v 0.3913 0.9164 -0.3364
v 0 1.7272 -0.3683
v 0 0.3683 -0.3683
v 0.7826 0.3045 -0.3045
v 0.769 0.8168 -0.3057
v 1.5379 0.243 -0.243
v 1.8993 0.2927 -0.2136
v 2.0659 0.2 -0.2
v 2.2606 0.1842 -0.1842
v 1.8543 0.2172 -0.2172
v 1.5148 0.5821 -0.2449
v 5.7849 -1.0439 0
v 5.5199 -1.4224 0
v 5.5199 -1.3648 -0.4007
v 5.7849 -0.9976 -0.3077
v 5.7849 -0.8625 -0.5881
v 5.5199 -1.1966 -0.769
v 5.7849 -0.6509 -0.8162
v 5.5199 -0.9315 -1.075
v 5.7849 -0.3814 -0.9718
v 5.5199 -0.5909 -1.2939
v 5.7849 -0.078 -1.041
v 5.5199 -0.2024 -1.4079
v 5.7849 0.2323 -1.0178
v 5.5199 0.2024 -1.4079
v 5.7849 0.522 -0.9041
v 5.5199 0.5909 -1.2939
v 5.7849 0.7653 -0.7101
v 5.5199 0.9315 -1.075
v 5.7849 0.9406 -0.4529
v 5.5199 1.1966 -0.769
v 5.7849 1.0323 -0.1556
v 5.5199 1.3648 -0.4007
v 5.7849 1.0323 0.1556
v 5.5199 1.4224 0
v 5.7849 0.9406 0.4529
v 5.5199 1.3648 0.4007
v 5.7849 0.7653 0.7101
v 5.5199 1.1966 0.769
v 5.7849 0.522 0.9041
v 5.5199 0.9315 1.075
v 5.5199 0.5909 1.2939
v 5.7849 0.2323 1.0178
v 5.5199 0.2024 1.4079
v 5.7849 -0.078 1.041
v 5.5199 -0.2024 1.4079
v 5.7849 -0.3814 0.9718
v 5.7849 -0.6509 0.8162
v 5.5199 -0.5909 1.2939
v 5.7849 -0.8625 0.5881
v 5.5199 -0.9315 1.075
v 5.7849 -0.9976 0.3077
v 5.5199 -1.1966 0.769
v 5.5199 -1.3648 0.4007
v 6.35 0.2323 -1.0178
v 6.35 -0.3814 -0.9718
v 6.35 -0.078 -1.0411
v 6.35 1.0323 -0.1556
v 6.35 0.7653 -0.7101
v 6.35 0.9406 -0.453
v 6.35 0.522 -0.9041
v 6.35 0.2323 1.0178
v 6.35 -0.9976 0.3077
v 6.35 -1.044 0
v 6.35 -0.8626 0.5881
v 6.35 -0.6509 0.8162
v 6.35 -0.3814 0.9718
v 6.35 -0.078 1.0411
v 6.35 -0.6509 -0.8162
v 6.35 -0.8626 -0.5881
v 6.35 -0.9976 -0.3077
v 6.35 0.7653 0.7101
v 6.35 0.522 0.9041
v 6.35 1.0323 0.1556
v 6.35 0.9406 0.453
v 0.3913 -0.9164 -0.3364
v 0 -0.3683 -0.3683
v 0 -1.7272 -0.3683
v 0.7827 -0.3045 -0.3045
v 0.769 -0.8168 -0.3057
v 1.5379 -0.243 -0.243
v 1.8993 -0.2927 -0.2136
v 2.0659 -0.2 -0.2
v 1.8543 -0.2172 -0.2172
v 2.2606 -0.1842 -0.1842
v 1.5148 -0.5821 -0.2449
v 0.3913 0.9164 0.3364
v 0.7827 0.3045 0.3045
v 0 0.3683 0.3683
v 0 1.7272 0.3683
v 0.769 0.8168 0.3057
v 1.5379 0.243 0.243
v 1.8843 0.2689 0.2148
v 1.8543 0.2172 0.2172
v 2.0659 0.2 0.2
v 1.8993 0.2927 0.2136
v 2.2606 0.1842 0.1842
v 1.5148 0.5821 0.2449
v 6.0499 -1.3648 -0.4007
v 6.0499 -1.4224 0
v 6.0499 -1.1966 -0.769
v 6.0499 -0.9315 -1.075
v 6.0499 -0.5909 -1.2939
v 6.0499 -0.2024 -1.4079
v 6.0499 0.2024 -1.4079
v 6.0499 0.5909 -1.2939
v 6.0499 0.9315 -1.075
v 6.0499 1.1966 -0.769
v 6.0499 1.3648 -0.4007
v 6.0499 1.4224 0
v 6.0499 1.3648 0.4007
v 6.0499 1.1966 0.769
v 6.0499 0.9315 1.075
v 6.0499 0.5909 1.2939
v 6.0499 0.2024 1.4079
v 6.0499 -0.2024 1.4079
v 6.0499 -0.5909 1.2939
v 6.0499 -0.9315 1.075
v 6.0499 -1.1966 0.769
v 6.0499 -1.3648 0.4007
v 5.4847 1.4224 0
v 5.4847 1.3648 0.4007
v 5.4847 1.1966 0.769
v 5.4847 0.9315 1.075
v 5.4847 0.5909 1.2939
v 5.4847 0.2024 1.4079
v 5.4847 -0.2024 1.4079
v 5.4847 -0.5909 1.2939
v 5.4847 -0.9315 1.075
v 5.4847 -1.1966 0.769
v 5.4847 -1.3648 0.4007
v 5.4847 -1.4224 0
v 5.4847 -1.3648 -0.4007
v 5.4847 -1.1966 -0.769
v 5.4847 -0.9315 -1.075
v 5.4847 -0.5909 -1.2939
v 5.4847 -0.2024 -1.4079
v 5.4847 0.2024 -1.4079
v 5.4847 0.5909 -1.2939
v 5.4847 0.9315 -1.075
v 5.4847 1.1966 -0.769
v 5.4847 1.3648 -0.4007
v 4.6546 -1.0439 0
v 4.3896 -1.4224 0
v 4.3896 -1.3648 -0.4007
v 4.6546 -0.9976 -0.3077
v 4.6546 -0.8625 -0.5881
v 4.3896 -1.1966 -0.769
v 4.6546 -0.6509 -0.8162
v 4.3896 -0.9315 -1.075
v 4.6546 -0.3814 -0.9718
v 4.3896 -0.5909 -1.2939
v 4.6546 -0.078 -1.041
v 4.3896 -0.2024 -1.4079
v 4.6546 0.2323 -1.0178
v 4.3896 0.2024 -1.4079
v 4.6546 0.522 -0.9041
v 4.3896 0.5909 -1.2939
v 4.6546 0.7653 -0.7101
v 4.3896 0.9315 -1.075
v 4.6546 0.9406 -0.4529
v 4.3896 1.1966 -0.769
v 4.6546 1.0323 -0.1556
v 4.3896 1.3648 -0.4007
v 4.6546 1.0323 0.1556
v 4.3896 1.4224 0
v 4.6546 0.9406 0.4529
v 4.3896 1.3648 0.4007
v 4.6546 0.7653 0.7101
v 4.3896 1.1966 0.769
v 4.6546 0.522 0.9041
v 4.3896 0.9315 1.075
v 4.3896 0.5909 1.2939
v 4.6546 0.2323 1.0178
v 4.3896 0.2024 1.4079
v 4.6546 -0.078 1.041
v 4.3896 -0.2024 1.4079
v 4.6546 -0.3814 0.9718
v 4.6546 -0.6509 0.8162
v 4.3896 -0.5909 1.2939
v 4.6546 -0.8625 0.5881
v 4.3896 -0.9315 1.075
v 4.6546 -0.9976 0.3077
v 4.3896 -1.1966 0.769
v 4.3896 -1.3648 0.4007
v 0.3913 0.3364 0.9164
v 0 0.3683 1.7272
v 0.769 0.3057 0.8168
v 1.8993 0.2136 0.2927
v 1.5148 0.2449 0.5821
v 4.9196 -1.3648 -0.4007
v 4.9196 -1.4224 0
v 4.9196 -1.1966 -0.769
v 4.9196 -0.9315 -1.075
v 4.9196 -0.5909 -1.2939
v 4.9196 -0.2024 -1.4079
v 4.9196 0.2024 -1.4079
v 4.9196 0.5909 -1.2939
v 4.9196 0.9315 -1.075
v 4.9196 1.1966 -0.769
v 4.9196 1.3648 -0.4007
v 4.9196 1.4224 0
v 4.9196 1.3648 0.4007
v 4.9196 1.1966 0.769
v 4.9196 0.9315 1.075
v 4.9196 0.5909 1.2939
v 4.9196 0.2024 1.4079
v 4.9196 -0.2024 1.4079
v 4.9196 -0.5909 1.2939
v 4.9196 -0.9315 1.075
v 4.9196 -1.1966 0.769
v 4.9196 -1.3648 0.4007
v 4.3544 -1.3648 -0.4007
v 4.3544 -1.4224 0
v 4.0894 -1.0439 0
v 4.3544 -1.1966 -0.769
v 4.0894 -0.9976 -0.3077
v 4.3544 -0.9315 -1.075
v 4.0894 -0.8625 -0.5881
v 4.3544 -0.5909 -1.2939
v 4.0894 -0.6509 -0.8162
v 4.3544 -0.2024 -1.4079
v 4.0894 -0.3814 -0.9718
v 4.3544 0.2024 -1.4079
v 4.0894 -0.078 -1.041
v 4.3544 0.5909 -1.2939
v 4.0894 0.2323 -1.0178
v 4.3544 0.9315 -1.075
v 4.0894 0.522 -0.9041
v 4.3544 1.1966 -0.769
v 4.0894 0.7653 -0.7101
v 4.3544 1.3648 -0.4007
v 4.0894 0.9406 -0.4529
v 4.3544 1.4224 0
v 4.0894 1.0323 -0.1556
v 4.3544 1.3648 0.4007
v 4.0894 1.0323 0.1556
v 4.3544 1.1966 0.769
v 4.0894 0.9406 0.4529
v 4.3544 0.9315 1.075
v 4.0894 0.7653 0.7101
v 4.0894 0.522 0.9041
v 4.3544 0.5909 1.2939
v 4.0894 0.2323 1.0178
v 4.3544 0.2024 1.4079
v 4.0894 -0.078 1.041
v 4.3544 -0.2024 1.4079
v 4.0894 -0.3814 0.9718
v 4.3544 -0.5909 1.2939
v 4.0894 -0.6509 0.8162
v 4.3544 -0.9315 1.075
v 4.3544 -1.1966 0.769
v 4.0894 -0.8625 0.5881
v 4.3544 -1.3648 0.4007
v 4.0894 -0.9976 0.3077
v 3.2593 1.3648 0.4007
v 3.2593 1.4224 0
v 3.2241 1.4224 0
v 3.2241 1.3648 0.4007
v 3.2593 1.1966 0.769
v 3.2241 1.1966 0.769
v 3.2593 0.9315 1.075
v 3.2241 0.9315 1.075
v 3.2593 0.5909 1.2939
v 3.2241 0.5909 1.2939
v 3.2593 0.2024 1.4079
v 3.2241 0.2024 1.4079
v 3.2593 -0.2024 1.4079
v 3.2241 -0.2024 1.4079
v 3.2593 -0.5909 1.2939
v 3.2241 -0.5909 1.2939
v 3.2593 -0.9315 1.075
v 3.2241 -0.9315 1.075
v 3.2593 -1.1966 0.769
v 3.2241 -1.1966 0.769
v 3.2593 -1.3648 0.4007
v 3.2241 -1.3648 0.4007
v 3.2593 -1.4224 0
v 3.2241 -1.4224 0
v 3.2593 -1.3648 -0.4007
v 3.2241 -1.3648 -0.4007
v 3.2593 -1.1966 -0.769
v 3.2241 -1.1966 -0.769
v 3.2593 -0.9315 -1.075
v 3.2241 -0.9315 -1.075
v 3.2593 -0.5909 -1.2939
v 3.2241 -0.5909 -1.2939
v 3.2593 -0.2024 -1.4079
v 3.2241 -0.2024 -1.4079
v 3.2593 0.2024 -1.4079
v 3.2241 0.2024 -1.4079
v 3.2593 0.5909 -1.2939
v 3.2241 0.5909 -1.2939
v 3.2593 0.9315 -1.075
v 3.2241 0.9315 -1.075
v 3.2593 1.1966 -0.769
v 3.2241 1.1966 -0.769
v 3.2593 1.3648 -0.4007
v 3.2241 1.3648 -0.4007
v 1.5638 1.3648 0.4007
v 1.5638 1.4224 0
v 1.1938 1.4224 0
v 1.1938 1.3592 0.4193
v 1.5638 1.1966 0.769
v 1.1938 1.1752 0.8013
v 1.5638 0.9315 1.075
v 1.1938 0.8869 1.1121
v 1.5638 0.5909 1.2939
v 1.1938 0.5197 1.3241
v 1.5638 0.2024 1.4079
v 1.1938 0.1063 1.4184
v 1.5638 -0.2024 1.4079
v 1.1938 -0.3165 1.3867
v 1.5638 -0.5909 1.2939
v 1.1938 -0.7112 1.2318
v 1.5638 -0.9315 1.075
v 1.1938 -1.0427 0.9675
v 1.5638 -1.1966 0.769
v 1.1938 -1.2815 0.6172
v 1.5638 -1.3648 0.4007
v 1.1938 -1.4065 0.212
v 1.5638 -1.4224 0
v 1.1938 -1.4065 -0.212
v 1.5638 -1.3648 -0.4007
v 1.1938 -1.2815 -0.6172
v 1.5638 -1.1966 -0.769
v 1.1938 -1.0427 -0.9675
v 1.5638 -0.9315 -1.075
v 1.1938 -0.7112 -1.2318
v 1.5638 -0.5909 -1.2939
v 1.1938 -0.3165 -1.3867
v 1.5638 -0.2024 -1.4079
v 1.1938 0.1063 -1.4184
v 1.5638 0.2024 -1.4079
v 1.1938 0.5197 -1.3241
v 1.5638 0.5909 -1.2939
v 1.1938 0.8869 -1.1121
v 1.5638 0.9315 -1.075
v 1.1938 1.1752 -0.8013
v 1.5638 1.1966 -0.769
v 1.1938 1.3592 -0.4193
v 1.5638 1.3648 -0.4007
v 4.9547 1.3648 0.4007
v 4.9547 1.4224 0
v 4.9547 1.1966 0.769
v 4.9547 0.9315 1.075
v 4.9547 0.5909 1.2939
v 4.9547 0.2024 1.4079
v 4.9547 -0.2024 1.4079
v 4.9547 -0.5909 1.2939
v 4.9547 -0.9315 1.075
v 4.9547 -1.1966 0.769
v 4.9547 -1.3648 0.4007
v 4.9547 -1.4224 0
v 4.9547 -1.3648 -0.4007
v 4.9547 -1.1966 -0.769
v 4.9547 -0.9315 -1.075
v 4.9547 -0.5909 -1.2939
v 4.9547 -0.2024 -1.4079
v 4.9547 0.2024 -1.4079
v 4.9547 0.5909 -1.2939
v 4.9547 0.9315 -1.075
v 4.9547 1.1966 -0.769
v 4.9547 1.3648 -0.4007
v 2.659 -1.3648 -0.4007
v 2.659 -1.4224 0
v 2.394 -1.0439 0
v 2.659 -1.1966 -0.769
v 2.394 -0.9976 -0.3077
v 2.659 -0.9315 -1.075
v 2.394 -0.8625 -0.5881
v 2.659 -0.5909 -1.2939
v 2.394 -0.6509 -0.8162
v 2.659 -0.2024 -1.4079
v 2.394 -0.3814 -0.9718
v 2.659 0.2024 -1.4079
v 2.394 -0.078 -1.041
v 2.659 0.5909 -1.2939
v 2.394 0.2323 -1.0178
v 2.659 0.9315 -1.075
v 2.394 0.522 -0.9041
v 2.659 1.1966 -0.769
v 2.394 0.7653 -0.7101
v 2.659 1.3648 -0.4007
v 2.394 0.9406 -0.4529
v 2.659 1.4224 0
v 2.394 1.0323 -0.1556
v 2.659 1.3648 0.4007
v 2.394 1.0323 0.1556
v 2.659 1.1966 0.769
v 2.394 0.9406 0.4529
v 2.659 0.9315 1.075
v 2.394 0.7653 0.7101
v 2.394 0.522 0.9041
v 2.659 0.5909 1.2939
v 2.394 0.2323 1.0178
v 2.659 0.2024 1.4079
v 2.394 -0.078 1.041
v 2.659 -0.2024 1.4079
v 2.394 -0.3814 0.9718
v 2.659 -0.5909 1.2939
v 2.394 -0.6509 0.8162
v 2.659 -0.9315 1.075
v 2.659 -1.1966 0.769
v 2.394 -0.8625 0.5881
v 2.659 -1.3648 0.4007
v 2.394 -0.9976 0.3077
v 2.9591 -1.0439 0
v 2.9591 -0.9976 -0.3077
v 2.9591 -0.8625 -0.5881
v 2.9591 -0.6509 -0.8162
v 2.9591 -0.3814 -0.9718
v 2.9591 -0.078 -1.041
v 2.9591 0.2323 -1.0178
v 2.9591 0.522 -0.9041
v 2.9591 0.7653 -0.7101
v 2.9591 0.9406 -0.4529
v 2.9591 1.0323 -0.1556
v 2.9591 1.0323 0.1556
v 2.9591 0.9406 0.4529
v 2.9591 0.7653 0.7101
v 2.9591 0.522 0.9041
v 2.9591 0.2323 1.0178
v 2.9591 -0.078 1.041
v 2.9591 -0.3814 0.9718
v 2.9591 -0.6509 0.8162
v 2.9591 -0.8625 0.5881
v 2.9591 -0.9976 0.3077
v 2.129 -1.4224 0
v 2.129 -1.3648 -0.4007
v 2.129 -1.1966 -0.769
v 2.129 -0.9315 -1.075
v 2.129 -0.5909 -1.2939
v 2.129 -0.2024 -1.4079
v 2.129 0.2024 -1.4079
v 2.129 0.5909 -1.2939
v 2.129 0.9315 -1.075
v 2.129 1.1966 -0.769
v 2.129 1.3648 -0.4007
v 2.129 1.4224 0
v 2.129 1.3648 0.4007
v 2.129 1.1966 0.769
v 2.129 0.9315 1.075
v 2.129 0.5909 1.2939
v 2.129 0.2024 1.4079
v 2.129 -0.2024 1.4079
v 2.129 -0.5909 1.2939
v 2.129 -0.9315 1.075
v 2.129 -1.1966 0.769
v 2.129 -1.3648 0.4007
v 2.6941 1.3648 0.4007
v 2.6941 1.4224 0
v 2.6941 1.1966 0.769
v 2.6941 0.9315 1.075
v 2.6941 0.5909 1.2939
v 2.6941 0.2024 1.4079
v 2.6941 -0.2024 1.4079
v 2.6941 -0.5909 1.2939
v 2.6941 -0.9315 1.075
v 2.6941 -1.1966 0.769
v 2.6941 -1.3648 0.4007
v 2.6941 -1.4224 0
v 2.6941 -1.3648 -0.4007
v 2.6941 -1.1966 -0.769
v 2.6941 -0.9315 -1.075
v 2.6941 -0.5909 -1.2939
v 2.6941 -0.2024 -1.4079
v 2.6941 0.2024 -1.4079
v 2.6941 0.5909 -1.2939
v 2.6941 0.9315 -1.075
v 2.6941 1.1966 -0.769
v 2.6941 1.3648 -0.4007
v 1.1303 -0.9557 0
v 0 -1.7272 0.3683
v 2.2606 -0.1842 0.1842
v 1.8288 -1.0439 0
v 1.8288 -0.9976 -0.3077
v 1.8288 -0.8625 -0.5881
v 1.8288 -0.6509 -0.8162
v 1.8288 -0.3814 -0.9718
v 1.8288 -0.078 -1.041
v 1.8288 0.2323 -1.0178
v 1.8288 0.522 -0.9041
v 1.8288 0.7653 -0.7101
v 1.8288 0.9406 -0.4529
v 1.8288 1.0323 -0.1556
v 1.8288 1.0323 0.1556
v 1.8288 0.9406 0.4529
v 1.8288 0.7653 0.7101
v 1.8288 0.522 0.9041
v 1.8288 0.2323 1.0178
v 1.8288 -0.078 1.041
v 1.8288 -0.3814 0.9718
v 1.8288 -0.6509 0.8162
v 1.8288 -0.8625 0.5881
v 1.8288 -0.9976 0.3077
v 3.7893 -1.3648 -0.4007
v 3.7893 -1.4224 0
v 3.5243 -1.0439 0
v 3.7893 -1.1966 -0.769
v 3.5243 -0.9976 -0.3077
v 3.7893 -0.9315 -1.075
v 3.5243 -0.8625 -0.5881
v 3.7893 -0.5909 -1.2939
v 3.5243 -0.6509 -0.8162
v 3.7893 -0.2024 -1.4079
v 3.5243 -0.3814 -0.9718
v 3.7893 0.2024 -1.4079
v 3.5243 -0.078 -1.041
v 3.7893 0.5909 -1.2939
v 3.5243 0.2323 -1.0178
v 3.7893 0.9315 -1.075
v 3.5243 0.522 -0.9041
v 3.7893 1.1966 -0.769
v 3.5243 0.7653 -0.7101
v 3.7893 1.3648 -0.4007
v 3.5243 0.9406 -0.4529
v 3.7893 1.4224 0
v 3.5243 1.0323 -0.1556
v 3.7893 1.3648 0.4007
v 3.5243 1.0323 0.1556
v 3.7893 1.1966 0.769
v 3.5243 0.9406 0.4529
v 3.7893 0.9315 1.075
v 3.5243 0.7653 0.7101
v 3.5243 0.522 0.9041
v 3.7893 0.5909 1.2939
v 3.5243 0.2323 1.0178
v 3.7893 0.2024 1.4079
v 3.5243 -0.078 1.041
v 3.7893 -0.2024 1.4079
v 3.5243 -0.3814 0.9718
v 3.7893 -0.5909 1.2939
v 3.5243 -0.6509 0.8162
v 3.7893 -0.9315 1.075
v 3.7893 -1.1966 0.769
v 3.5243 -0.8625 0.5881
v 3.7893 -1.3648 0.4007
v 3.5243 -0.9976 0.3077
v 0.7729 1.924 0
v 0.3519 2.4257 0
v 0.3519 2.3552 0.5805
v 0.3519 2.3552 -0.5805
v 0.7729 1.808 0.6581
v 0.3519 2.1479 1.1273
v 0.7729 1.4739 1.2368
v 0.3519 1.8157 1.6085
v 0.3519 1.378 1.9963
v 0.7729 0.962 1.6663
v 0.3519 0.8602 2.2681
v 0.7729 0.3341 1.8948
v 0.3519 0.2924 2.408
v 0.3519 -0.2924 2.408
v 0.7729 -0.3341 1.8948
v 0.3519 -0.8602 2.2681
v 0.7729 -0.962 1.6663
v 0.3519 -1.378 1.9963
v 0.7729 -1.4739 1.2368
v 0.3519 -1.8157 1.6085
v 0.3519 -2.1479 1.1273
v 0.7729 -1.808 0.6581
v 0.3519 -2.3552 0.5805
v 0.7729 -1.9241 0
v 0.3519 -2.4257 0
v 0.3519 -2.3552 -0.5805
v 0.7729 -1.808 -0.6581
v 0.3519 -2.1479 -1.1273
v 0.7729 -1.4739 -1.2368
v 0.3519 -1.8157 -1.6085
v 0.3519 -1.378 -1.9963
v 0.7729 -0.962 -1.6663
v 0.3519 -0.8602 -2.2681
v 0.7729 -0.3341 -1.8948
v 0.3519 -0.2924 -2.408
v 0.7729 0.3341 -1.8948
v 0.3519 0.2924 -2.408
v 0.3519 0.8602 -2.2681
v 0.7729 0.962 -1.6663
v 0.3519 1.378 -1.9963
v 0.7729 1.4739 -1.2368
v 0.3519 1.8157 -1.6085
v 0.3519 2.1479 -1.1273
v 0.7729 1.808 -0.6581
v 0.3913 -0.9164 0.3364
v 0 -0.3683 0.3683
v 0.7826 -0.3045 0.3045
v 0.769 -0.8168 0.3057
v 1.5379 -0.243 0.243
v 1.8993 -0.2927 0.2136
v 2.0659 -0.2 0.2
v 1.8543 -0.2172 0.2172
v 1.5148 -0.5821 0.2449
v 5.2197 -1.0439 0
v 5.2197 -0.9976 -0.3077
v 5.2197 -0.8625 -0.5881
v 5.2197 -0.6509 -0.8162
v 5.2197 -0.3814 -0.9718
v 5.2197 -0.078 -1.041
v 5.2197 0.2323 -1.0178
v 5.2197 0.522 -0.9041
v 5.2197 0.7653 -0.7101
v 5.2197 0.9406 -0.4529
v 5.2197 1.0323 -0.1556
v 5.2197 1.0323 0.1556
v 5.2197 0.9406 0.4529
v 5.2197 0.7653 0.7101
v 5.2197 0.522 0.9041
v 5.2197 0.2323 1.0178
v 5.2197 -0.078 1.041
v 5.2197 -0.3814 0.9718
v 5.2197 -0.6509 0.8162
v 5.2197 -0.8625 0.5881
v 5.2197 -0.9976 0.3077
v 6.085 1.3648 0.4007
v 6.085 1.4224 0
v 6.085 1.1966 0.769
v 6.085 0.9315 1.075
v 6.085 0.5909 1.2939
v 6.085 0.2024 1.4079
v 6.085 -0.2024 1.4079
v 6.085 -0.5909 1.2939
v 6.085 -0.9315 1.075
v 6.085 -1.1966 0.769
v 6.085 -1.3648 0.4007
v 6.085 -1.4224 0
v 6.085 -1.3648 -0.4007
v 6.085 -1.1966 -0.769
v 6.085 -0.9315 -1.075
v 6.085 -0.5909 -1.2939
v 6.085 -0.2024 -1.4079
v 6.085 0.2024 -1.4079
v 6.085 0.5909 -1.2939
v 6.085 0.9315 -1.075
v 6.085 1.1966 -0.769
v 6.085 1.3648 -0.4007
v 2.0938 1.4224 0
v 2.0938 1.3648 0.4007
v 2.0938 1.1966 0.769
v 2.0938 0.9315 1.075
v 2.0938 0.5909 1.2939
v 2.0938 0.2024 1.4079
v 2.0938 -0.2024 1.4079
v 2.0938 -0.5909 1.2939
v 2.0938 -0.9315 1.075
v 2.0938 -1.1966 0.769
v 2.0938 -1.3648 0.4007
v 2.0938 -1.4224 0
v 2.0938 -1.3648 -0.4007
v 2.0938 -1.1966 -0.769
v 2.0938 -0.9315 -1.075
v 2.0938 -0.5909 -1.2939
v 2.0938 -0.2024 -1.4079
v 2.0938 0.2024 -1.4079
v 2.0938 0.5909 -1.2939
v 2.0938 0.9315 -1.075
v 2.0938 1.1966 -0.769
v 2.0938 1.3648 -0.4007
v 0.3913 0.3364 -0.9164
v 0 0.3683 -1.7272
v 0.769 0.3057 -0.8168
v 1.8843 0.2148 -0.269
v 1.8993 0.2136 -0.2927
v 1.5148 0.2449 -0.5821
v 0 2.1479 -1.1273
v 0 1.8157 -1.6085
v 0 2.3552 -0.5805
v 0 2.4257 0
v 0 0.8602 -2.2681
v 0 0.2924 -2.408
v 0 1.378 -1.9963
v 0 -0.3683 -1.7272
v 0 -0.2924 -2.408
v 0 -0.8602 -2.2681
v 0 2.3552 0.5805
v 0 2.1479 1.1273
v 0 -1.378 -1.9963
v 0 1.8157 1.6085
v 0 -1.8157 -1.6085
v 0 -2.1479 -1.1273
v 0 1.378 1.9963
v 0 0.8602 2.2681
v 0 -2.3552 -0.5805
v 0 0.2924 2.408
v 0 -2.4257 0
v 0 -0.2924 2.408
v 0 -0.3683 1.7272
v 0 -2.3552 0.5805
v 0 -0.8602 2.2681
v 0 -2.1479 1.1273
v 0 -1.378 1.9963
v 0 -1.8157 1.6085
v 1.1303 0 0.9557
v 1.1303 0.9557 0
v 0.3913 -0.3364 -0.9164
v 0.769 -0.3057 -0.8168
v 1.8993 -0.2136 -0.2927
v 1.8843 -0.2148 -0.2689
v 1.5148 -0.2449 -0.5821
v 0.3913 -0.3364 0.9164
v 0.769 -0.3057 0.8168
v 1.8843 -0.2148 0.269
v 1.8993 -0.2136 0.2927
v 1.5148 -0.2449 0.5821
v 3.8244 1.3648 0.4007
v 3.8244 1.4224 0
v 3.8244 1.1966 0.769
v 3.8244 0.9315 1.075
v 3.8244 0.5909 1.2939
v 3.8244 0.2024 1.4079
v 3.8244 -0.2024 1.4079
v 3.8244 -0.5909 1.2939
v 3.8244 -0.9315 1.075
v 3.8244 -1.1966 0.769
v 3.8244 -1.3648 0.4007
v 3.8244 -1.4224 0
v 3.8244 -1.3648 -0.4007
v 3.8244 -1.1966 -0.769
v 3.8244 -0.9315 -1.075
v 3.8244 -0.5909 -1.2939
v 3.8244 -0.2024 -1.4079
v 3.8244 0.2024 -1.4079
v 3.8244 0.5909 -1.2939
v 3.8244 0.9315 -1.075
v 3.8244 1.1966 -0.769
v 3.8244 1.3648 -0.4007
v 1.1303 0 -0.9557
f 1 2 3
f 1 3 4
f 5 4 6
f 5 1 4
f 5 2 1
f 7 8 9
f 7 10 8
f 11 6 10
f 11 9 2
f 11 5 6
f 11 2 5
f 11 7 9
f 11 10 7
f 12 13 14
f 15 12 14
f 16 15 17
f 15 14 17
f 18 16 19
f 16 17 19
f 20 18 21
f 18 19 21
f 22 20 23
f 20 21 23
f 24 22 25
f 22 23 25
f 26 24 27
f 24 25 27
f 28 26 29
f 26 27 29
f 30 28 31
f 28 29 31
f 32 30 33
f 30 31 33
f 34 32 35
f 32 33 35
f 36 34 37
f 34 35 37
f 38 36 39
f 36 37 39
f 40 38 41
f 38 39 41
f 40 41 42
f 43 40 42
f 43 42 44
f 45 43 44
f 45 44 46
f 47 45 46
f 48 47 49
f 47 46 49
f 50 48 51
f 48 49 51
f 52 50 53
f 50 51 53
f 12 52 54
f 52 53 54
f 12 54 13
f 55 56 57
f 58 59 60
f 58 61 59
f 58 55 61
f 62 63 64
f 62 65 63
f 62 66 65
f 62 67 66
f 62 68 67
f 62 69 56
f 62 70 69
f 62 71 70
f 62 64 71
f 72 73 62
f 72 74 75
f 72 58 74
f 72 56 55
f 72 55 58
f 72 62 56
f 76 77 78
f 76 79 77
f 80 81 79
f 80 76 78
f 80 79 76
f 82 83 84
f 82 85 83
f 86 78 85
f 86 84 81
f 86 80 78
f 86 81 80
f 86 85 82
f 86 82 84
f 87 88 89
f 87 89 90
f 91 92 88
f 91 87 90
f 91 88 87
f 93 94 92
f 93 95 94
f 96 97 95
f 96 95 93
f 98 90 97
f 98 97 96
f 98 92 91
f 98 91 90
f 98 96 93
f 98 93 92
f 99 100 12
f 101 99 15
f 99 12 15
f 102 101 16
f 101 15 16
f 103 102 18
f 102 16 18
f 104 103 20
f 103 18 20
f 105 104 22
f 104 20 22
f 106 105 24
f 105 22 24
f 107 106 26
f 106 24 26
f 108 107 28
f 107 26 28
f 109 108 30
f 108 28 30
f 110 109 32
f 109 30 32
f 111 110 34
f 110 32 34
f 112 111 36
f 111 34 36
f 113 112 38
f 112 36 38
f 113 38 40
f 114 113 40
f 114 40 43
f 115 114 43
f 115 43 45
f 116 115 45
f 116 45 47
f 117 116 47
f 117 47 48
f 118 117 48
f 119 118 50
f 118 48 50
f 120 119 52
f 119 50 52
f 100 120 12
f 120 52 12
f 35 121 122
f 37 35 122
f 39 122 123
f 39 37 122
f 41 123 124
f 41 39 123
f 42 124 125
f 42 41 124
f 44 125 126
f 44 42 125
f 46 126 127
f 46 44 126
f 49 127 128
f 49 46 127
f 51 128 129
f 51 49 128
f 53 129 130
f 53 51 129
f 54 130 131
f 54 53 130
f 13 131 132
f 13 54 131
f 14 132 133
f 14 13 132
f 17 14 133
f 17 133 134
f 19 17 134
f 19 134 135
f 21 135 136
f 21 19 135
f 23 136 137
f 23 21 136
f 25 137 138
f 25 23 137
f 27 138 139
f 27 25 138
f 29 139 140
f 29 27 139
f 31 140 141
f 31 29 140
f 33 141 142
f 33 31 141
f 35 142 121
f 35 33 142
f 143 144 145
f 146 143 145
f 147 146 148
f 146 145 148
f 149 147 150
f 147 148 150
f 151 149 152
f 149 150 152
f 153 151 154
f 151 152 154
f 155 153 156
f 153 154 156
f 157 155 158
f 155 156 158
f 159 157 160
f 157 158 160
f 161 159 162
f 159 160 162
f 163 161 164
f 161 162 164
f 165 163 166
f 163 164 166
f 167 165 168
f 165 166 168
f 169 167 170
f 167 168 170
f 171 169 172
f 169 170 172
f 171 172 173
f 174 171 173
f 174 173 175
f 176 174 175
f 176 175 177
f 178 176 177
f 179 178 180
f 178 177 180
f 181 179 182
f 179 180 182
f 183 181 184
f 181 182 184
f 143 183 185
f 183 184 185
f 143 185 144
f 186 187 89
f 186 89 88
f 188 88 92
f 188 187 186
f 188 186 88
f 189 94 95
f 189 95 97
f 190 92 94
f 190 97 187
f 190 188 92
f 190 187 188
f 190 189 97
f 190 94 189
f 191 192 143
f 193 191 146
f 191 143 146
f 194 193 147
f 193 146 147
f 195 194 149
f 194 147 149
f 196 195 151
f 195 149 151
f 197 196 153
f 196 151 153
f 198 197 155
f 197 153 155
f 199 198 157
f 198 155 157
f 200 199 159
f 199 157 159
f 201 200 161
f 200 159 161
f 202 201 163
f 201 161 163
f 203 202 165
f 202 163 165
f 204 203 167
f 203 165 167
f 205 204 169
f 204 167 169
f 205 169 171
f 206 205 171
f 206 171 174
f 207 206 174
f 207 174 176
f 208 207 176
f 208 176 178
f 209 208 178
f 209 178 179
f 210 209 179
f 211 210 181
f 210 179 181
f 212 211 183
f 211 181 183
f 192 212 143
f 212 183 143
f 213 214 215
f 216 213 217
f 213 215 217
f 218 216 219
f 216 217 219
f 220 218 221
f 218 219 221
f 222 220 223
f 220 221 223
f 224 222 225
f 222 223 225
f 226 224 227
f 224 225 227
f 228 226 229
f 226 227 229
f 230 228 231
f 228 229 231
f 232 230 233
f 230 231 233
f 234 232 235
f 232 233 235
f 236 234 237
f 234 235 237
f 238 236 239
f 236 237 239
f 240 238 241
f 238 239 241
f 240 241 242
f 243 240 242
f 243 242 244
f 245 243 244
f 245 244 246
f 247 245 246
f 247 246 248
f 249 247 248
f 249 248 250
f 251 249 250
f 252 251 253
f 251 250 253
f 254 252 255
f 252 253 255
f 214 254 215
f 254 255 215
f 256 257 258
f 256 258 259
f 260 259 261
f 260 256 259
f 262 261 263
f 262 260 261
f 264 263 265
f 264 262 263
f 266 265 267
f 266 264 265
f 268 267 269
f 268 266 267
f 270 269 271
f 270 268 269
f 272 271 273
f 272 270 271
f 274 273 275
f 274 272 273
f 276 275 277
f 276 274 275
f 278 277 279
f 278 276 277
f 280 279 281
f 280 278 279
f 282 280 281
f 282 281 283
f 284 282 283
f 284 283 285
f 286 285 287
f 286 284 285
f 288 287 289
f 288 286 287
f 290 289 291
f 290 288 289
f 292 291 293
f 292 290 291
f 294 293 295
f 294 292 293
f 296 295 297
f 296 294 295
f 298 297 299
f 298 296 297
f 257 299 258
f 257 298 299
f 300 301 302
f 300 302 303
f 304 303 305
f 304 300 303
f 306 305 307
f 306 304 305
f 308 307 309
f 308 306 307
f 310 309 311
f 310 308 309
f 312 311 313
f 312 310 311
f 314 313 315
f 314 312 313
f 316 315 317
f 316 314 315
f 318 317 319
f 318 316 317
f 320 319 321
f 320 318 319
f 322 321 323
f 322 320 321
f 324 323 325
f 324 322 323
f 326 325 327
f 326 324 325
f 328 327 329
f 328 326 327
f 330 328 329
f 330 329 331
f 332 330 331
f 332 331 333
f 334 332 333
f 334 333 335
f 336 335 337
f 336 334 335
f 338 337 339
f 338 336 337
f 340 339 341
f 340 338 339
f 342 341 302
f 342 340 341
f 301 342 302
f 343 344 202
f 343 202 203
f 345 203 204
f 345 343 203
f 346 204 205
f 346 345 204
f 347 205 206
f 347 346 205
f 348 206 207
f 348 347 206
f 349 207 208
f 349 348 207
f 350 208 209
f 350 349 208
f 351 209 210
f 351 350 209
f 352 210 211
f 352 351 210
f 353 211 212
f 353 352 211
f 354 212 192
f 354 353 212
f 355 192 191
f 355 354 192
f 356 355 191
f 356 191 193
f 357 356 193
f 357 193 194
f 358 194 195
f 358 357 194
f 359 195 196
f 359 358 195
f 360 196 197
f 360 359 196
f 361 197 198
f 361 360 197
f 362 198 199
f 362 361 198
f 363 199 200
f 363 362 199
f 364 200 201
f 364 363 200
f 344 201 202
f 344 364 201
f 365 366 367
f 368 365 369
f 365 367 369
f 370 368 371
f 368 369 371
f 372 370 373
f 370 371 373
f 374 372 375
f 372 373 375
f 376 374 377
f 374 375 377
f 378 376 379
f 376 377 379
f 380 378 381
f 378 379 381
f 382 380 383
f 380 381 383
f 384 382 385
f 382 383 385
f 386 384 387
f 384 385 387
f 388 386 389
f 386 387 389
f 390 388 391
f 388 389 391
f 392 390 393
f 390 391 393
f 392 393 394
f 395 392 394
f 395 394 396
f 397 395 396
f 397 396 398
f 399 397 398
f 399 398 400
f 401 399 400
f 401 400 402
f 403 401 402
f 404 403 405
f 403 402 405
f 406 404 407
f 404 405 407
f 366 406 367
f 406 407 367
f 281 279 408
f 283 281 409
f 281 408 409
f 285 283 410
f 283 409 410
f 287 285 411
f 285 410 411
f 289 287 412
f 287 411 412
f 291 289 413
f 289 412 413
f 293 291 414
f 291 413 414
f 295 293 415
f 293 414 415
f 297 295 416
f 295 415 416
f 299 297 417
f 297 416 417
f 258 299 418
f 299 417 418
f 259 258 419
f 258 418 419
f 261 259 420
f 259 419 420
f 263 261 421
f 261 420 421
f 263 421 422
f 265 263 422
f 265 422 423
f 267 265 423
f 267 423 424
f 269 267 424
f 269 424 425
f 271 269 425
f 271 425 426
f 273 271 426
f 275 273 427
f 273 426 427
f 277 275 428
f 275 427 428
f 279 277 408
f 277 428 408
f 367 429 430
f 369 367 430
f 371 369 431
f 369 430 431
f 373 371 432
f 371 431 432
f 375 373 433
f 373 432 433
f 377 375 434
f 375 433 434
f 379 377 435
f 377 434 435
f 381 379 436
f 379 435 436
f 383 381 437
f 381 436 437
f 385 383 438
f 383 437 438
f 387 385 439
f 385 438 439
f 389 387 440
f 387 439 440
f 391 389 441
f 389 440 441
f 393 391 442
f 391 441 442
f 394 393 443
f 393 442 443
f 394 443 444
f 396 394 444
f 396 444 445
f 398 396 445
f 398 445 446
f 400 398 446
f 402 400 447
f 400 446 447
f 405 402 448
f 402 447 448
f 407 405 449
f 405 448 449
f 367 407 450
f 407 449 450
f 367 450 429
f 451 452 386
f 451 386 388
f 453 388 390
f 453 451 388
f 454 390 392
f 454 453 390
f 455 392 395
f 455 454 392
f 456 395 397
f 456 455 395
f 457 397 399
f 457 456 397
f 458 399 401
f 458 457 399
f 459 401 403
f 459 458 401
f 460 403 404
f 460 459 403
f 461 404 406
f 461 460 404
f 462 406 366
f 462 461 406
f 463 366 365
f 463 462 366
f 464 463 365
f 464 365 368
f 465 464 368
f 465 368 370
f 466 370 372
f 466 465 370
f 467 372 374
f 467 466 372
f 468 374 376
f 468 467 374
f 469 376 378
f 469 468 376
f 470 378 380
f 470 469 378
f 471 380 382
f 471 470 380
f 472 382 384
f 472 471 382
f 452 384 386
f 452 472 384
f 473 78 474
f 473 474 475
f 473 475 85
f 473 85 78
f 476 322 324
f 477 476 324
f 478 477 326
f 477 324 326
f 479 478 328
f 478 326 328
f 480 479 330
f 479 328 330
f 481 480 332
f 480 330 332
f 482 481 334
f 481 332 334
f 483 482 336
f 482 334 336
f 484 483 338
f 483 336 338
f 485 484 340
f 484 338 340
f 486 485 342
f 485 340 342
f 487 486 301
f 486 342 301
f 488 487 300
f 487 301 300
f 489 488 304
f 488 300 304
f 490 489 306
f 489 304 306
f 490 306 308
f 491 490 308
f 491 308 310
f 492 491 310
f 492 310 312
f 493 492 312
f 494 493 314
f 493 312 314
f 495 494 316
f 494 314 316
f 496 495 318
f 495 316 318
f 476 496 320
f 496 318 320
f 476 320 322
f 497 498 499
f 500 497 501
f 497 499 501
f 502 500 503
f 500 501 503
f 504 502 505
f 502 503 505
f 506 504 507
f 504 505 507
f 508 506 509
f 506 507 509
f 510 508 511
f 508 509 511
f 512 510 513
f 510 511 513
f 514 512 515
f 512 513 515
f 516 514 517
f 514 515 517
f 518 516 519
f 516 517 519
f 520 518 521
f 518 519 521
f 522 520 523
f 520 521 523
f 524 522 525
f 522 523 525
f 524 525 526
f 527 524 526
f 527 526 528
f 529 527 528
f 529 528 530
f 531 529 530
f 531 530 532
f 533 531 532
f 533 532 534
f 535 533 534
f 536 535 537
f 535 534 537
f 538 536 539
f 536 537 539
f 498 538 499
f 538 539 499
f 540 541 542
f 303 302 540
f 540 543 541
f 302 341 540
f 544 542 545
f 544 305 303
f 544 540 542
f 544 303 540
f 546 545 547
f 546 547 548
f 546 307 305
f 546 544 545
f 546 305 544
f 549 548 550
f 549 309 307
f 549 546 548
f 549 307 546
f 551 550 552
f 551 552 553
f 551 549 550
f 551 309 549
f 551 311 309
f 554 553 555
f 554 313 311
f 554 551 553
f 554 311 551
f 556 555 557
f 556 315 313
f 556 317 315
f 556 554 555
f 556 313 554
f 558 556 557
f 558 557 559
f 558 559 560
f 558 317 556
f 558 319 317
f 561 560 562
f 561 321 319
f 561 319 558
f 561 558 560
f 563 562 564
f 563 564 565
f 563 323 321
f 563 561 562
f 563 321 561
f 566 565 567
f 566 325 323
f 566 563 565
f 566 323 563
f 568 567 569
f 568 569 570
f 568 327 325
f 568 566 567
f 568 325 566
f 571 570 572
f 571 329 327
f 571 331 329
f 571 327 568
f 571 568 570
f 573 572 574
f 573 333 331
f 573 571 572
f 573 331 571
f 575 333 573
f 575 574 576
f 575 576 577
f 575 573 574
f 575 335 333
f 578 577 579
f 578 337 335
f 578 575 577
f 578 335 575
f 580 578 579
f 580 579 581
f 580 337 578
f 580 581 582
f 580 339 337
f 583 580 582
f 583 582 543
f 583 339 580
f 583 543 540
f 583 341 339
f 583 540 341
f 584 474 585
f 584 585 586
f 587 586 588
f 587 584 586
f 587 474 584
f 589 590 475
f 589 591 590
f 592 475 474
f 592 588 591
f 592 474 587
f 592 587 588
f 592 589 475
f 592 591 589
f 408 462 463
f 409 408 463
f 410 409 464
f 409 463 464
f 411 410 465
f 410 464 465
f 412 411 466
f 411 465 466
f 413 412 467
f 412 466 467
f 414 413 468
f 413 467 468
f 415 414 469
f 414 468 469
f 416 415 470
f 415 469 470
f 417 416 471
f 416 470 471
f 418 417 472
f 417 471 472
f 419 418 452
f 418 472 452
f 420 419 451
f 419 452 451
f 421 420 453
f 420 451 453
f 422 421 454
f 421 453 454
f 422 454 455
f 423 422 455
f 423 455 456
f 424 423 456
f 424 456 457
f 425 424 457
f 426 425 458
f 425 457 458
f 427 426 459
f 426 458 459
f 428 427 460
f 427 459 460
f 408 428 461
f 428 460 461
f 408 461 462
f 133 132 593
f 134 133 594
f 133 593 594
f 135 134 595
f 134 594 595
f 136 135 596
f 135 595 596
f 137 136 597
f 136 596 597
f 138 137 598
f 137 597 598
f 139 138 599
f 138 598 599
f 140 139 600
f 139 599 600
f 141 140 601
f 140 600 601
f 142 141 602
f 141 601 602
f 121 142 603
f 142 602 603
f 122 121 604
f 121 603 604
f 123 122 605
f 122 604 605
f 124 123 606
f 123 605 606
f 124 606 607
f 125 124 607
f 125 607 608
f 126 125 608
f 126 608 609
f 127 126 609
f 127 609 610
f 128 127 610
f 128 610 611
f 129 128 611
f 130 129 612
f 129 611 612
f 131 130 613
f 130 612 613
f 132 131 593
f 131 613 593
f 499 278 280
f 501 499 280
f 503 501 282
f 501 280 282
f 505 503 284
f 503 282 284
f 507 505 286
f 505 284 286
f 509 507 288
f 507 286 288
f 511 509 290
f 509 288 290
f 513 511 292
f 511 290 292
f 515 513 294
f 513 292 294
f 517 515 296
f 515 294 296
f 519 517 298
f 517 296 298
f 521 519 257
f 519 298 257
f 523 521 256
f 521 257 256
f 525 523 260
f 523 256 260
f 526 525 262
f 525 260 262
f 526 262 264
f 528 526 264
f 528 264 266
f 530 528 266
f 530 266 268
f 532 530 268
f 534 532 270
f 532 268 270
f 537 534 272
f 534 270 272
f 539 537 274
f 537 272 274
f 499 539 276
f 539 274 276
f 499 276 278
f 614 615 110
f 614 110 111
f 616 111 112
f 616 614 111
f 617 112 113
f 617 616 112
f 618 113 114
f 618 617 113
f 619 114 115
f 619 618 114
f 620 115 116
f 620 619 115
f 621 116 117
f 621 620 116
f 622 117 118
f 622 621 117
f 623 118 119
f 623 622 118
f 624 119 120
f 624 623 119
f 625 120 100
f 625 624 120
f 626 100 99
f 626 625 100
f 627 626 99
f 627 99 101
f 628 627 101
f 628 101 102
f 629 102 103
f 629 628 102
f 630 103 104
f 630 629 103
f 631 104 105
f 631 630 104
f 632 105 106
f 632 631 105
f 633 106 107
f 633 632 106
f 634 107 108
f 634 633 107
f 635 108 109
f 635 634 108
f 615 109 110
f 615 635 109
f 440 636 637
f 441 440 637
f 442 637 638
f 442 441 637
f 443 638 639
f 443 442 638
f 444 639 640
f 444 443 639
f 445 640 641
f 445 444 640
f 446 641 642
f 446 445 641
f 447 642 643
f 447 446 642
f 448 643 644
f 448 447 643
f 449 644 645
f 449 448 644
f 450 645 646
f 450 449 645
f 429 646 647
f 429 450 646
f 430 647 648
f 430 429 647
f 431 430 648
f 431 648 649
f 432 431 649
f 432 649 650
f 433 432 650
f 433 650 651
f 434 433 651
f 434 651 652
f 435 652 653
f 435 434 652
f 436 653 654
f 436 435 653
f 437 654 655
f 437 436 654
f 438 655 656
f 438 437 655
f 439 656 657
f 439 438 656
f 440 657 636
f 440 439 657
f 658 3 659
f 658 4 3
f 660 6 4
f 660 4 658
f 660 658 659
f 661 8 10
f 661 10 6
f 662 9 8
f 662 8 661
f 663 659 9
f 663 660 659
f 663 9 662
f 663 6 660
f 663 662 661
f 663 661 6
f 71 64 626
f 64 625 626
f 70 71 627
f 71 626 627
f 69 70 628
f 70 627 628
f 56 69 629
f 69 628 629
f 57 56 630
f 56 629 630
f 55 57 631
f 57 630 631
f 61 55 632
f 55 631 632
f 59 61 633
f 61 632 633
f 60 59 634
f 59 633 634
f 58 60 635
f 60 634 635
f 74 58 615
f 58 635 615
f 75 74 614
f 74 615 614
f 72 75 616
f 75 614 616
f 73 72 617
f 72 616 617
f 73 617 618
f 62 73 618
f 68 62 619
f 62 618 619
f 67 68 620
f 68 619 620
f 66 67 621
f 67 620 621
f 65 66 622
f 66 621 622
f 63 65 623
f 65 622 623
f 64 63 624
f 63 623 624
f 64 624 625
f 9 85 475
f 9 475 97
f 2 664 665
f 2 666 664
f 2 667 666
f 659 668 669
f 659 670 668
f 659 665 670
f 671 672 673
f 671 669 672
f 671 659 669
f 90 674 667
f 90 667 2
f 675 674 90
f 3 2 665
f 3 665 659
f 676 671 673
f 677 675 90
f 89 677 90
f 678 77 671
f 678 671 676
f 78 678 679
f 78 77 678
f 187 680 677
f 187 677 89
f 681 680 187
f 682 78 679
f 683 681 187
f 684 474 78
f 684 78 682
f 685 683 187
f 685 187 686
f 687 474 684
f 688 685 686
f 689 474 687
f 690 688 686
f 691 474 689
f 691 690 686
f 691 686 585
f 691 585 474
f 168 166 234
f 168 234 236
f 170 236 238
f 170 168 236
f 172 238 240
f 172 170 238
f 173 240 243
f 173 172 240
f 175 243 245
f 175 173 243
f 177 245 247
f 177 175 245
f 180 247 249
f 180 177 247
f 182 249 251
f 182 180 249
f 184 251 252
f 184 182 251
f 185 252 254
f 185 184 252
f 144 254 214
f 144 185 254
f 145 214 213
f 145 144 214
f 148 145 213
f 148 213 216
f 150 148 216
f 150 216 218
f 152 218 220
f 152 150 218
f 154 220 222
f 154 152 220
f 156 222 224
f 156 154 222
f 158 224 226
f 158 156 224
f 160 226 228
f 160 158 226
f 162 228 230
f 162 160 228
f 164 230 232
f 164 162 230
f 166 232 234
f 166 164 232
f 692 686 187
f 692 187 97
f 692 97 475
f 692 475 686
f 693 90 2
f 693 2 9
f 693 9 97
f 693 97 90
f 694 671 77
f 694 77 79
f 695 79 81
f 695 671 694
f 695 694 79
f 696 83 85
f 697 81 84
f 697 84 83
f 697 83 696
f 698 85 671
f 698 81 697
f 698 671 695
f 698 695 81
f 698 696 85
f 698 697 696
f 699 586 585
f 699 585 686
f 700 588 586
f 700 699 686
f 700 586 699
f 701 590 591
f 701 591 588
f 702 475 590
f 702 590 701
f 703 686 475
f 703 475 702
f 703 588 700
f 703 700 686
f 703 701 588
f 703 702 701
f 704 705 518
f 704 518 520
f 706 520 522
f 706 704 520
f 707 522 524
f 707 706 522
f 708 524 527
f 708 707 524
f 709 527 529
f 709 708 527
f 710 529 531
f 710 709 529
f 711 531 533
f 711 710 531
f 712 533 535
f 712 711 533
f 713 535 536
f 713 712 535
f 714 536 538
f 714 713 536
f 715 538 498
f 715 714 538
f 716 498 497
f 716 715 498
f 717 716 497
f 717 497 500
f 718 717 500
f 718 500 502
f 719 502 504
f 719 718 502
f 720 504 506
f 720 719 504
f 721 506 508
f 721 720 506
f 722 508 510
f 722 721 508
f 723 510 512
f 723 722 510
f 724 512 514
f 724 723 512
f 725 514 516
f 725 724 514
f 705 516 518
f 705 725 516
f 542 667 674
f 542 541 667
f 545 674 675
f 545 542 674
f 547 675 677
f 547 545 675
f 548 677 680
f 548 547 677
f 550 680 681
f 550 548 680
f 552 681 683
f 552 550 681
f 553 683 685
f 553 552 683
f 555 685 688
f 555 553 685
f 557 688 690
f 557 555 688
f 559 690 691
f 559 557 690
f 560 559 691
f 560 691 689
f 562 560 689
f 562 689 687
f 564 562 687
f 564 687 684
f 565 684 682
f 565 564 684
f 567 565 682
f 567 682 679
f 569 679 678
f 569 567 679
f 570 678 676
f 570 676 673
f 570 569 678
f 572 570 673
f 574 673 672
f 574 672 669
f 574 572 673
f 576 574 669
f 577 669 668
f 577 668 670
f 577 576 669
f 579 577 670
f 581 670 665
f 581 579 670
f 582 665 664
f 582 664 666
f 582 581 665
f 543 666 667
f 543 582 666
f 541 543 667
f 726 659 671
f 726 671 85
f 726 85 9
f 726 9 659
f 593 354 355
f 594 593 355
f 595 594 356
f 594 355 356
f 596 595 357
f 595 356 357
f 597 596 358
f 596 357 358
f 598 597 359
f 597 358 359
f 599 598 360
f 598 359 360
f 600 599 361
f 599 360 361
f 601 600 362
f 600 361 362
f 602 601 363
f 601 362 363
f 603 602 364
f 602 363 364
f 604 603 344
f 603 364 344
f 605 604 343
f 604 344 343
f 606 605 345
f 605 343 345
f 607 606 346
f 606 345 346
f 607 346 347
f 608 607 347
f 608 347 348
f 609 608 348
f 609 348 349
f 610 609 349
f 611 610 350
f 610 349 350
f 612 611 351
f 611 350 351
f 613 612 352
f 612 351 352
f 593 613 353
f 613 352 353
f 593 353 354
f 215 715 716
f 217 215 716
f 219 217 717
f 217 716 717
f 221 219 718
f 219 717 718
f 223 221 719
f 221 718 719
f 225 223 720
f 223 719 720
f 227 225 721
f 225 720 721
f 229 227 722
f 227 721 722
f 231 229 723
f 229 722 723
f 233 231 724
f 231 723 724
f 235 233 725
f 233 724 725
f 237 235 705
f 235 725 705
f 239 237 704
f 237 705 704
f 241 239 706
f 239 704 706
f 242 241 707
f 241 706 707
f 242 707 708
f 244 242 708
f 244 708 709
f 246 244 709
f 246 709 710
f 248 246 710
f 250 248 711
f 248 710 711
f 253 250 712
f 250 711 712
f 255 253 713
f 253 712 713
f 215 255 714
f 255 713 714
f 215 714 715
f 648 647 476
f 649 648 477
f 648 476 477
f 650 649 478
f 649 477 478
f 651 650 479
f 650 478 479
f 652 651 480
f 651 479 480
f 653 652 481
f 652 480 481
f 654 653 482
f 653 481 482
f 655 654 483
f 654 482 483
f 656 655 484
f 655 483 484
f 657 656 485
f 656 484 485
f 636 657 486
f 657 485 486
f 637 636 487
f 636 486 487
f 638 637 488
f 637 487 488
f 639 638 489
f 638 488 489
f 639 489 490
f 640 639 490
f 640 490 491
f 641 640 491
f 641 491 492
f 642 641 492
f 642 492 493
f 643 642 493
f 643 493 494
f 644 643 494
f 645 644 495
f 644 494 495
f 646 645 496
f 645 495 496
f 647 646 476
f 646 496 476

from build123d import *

# Parameters (mm, degrees)
SKETCH3_W         = 0.7366
SKETCH3_H         = 3.4544
SKETCH4_W         = 0.3683
SKETCH4_H         = 0.3683
CIRPATTERN1_COUNT = 2
CIRPATTERN1_ANGLE = 90
THDSCHPAT_COUNT   = 9
THDSCHPAT_PITCH   = 0.56515


with BuildPart() as part:
    # BodySke → Base-Revolve (revolve)
    with BuildSketch(Plane.XY):
        Polygon((0, 0), (0, 2.4257), (0.35193134, 2.4257), (1.1938, 1.4224), (6.35, 1.4224), (6.35, 0), align=None)
    revolve(axis=Axis((-6.35, 0, 0), (1, 0, 0)))

    # Sketch3 → Cross section 0
    with BuildSketch(Plane.ZY):
        Rectangle(SKETCH3_W, SKETCH3_H)
    # Sketch4 → Cross section 1
    with BuildSketch(Plane.ZY.offset(-2.2606)):
        Rectangle(SKETCH4_W, SKETCH4_H)
    cross = loft(mode=Mode.SUBTRACT)

    # CirPattern1: Cross ×2 about axis
    cirpattern1_axis = Axis((0, 0, 0), (1, 0, 0))
    for i in range(1, CIRPATTERN1_COUNT):
        add(cross.rotate(cirpattern1_axis, i * CIRPATTERN1_ANGLE / (CIRPATTERN1_COUNT - 1)), mode=Mode.SUBTRACT)

    # ThdSchSke → ThreadSchematic (revolve, cut)
    with BuildSketch(Plane.XY):
        Polygon((1.8288254, -1.04394), (1.563824855, -1.4224), (1.563824855, -1.778), (2.093825945, -1.778), (2.093825945, -1.4224), align=None)
    threadschematic = revolve(axis=Axis((-3.175, 0, 0), (1, 0, 0)), mode=Mode.SUBTRACT)

    # ThdSchPat: ThreadSchematic ×9
    with Locations(*[(i * THDSCHPAT_PITCH, 0, 0) for i in range(1, THDSCHPAT_COUNT)]):
        add(threadschematic, mode=Mode.SUBTRACT)


solid = part.part
